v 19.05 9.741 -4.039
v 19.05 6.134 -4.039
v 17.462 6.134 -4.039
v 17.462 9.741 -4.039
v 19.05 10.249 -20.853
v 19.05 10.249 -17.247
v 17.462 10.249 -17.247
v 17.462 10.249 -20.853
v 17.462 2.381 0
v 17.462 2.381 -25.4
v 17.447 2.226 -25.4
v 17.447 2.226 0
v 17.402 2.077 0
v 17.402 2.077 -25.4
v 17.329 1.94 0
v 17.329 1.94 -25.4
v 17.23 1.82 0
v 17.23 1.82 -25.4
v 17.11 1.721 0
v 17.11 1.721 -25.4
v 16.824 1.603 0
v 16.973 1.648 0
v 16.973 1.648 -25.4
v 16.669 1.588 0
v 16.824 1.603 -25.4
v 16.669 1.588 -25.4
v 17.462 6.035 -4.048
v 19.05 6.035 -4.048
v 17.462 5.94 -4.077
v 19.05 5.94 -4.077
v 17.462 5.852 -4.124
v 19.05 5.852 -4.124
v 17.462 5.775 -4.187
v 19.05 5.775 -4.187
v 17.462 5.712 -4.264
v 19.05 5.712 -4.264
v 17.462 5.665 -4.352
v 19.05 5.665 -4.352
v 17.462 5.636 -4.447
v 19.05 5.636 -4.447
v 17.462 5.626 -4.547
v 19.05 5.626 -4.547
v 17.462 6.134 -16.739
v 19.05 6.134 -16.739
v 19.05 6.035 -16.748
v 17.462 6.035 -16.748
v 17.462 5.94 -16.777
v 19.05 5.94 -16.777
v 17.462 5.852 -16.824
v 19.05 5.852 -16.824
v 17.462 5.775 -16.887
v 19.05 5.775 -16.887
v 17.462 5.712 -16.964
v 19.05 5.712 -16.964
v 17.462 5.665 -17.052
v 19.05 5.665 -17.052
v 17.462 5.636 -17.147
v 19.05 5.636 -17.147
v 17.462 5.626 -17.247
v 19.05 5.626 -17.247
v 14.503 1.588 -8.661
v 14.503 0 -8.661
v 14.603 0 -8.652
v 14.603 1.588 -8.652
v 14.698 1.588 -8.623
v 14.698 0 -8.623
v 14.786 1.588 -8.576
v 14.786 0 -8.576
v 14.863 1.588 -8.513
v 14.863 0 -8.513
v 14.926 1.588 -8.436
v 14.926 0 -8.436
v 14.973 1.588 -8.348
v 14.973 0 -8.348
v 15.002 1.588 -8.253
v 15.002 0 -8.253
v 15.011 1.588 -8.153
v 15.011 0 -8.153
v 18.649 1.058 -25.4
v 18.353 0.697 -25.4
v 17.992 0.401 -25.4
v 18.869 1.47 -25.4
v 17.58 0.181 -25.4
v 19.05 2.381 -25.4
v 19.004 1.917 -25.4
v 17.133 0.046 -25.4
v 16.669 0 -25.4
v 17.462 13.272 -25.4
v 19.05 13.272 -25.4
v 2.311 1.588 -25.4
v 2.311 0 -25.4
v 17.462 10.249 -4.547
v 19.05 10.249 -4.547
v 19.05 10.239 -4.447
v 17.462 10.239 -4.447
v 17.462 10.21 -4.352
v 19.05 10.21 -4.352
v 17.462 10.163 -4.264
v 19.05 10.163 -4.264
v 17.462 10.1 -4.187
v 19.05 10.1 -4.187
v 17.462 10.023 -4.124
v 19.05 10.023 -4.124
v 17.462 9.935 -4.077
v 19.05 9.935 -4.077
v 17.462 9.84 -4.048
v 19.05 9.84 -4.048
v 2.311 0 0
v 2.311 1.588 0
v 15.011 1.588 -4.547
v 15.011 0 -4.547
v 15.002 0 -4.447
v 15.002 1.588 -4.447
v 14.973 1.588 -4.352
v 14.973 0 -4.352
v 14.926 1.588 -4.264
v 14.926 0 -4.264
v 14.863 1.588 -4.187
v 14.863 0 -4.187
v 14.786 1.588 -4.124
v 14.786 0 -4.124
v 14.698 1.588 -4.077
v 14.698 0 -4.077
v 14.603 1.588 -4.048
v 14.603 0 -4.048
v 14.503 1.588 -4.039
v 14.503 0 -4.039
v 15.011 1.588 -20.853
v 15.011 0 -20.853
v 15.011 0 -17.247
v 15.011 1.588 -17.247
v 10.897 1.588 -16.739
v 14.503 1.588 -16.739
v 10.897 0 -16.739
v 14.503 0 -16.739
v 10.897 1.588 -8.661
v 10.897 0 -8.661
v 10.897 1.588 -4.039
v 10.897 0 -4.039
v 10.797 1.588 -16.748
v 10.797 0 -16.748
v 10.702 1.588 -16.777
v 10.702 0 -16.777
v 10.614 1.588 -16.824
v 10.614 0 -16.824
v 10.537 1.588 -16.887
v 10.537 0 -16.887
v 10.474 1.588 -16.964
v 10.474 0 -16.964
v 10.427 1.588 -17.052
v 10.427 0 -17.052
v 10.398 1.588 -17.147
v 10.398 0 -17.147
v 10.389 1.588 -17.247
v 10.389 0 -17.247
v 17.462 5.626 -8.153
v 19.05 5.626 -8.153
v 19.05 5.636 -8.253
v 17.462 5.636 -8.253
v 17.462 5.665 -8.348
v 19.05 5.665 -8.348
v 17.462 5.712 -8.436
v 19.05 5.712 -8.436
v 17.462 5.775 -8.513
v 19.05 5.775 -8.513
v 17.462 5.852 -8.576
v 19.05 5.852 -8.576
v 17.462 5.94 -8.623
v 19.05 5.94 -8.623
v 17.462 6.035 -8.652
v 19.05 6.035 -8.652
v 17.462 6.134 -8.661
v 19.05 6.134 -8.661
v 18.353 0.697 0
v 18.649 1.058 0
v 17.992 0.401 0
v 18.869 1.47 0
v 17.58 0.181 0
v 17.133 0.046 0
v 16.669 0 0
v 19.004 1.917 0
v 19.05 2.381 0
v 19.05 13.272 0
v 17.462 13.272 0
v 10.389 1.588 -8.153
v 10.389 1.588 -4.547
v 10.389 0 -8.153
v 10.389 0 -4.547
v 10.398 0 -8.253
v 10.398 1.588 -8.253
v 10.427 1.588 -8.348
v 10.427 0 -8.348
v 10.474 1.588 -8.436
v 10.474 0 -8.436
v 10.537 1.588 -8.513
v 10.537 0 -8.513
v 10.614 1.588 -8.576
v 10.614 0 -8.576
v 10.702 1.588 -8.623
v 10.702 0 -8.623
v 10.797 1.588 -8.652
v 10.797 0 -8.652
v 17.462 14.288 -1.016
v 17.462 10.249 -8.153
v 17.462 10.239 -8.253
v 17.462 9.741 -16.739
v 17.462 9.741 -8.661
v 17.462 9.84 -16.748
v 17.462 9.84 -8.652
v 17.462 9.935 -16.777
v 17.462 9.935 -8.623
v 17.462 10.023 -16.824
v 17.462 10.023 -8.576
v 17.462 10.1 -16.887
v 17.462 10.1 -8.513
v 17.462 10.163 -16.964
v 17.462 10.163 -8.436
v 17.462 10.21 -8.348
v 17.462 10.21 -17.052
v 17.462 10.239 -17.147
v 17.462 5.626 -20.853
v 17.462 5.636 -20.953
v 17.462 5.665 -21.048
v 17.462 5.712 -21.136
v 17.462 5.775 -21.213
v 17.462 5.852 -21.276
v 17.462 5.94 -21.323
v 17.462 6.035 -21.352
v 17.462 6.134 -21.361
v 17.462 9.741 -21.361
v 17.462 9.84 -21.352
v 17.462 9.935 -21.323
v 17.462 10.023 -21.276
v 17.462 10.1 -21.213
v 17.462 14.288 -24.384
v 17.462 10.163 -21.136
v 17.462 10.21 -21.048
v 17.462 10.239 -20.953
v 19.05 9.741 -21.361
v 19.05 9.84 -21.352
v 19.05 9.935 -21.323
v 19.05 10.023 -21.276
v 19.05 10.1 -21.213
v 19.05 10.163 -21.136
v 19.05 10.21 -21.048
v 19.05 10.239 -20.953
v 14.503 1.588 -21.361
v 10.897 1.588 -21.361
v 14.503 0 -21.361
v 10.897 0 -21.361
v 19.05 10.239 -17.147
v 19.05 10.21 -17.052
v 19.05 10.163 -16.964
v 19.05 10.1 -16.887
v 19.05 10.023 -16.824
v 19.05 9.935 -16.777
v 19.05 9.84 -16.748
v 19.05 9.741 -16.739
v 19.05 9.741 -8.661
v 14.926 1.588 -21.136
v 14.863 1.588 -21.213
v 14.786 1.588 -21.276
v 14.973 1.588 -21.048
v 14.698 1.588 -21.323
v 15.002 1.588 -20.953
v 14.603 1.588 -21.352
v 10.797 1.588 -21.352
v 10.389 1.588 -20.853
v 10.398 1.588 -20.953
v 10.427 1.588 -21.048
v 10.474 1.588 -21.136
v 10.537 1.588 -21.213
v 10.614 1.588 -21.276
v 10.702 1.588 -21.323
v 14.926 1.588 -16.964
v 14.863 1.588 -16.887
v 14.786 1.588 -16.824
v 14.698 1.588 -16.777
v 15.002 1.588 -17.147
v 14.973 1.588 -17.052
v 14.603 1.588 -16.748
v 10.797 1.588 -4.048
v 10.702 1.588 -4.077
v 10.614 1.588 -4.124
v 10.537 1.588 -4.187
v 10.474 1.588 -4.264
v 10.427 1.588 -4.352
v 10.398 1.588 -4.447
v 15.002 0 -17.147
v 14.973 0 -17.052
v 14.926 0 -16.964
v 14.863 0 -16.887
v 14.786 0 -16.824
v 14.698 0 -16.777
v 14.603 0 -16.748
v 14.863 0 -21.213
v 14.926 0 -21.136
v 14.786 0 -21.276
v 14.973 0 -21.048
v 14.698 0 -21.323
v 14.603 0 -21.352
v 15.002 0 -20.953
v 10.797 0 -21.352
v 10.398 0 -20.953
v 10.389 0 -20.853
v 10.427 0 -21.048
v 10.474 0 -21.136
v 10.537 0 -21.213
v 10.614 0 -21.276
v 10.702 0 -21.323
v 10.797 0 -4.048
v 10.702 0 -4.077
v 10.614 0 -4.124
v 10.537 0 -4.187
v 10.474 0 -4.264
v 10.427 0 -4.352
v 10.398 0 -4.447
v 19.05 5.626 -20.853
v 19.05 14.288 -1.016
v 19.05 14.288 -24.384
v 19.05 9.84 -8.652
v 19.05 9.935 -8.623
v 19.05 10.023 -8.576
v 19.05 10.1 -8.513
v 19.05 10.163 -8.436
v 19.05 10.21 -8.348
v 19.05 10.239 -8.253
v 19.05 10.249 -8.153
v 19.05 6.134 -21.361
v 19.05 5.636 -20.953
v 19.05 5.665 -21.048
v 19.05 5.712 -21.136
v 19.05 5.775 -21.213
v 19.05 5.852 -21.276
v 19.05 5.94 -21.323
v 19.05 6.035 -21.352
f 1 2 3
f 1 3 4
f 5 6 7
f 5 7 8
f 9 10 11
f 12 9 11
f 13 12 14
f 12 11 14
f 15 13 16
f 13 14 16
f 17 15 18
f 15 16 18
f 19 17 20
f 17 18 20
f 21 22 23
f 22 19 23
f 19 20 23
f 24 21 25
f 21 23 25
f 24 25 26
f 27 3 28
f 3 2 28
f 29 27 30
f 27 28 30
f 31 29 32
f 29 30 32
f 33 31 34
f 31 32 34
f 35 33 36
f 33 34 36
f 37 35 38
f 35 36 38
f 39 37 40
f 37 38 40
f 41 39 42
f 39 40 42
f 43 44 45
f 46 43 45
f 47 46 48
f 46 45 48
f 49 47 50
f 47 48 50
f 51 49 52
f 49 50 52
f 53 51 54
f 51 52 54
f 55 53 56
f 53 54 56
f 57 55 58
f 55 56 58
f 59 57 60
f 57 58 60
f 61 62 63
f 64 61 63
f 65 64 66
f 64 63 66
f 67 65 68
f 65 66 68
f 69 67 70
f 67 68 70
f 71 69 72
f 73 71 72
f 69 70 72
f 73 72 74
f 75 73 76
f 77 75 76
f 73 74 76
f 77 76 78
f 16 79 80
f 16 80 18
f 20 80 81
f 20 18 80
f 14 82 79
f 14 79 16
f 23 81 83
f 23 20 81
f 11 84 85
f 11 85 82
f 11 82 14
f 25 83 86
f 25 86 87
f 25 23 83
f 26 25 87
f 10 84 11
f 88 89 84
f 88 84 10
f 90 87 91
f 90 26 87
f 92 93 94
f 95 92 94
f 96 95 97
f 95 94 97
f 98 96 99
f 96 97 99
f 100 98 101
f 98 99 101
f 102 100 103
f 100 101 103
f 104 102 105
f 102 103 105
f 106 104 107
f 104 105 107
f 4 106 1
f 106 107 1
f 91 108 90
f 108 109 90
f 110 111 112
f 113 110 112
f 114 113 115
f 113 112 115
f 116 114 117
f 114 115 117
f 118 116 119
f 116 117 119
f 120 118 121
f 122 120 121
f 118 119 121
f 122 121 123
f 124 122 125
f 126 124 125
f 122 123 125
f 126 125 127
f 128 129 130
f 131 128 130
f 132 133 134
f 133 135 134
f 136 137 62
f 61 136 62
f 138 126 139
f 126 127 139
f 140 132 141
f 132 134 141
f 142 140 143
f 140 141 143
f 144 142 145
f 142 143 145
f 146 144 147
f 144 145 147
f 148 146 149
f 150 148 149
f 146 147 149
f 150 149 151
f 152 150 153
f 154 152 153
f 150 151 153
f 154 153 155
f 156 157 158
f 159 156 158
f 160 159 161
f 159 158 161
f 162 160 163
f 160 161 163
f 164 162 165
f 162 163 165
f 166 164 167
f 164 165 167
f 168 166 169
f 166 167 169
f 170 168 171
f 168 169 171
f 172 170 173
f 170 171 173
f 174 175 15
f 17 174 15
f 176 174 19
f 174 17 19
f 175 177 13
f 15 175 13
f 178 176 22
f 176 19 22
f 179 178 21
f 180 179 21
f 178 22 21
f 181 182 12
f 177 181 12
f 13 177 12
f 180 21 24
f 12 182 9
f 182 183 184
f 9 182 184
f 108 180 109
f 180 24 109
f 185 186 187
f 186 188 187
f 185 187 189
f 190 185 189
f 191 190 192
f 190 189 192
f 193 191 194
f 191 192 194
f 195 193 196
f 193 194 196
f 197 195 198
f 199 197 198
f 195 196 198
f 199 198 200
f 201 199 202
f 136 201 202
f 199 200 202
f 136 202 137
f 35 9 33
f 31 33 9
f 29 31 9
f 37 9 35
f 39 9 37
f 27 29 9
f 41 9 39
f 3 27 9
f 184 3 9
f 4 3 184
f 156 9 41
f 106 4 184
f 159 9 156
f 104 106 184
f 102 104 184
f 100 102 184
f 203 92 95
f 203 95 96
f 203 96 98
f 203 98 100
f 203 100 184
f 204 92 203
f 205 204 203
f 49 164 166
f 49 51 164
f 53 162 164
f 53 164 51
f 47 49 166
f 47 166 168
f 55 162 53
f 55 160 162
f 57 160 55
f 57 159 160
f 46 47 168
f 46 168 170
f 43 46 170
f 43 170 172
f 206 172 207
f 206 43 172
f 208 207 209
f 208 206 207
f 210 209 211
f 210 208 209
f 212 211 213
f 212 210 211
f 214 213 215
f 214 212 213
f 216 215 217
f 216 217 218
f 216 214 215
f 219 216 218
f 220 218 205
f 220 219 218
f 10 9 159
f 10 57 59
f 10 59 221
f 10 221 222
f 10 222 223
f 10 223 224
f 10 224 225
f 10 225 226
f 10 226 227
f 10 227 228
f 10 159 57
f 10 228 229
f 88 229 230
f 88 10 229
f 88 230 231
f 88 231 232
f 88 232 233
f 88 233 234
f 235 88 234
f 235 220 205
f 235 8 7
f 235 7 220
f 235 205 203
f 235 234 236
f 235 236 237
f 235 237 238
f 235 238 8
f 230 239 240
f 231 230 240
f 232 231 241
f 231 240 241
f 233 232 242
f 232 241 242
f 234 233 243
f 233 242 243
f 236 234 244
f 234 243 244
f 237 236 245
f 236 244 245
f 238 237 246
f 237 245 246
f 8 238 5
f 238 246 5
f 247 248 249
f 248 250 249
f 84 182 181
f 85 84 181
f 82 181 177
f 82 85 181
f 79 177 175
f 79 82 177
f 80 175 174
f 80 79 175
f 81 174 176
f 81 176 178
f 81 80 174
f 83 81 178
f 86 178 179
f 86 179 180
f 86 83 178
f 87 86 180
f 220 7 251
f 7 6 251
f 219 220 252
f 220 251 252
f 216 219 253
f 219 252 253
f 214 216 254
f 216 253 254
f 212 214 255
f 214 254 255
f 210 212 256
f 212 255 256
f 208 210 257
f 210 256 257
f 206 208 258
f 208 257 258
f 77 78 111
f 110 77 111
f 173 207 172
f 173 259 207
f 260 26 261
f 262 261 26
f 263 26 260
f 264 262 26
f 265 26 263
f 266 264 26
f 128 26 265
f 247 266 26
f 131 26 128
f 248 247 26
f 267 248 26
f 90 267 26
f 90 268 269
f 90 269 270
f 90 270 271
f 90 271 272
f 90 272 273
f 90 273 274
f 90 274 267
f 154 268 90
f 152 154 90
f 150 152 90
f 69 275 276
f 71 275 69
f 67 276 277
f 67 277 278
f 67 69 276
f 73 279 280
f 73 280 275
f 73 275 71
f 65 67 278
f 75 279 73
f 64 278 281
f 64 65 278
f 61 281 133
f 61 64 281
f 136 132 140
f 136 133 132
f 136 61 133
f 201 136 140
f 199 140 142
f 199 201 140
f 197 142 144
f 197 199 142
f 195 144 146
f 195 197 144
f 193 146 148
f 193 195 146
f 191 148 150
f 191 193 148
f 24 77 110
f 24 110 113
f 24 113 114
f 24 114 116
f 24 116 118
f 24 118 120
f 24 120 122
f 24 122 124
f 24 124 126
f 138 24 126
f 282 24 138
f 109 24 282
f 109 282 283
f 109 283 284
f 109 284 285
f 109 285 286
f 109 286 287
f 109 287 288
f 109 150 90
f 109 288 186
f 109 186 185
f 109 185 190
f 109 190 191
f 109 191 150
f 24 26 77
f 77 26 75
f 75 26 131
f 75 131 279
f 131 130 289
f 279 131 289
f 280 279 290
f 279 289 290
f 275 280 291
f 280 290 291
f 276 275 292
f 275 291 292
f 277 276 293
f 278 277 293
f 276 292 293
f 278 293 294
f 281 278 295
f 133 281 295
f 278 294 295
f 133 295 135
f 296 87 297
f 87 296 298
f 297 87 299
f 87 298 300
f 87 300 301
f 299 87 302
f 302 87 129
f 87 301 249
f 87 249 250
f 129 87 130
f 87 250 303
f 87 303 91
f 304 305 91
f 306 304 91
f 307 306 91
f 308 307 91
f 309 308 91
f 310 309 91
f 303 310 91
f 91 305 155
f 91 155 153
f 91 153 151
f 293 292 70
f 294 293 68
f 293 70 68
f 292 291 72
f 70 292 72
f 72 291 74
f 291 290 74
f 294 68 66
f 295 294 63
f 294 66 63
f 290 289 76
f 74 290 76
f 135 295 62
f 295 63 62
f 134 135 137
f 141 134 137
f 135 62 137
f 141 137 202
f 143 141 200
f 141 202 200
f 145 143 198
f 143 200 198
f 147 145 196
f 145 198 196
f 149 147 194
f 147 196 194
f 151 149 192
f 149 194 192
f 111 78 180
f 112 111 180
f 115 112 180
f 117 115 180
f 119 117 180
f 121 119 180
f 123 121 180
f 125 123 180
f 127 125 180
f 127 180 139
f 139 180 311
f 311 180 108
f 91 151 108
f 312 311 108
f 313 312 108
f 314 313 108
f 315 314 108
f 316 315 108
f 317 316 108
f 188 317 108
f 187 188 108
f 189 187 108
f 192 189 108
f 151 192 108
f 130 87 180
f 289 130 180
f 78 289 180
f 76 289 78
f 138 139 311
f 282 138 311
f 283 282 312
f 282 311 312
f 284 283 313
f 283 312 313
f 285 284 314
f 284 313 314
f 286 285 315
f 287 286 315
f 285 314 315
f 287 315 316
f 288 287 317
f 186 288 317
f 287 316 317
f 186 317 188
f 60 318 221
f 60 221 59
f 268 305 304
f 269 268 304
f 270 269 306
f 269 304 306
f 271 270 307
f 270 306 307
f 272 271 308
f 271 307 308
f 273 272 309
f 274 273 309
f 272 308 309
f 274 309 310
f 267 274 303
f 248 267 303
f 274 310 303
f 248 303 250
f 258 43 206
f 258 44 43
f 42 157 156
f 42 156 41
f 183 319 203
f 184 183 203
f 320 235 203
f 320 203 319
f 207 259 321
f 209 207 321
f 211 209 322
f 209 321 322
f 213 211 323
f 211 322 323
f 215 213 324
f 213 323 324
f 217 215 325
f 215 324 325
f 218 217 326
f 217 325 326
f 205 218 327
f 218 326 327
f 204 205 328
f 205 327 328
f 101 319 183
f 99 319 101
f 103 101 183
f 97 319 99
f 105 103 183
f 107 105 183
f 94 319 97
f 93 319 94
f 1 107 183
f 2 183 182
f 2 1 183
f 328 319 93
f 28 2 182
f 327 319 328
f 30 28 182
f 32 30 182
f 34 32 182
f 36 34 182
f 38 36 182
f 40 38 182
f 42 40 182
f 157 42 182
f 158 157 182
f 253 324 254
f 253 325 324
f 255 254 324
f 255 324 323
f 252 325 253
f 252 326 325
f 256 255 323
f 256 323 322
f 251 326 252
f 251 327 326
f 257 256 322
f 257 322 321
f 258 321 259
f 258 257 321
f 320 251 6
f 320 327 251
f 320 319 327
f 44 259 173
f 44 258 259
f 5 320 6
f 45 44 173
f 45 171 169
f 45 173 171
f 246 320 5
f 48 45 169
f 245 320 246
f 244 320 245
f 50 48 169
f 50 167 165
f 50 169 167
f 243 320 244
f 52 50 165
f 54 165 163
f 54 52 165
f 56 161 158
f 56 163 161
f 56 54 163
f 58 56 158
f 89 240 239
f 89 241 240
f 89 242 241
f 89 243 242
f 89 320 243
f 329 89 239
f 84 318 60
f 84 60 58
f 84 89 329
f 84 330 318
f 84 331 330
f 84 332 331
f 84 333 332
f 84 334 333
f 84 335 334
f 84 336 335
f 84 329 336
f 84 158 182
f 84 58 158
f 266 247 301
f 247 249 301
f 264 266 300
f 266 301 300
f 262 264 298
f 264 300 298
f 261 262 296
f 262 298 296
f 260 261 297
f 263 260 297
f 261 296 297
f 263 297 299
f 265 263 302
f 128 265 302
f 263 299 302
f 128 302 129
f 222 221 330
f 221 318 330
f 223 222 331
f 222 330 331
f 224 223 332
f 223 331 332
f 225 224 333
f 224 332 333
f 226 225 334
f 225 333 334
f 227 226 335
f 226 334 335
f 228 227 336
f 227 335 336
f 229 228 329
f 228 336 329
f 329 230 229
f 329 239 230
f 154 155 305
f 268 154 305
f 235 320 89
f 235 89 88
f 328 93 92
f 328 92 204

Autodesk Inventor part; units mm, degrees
ref_plane "YZ Plane" through (0, 0, 0) normal (1, 0, 0) x (0, 1, 0)
ref_plane "XZ Plane" through (0, 0, 0) normal (0, 1, 0) x (-1, 0, 0)
sketch "Sketch1" plane through (0, 0, 0) normal (0, 1, 0) x (-1, 0, 0)
  line L0 (-19.05, 0) -> (19.05, 0)
  line L1 (19.05, 0) -> (19.05, -25.4)
  line L2 (19.05, -25.4) -> (-19.05, -25.4)
  line L3 (-19.05, -25.4) -> (-19.05, 0)
  line L4 (19.05, 0) -> (-19.05, -25.4) construction
  point P0 (0, 0)
  point P1 (0, 0)
  dimension "d0" = 38.1
  dimension "d1" = 25.4
extrude "Plate1" add sketch "Sketch1" along normal blind 1.5875
sketch "Sketch2" plane through (17.4625, 0, -25.4) normal (1, 0, 0) x (0, 1, 0)
  line L0 (0, 25.4) -> (0, 0)
  line L1 (0, 0) -> (14.2875, 0)
  line L2 (14.2875, 0) -> (14.2875, 25.4)
  line L3 (14.2875, 25.4) -> (0, 25.4)
edge flange "Flanges" height 12.7 angle 90 thickness 1.5875 bend radius 0.7937 thickness toward (1, 0, 0) relief tear relief width 1.5875 relief depth 0.7937 corner gap 1.5875 corner form 0 edges at (19.05, 1.5875, -12.7) (-19.05, 1.5875, -12.7) wall of the first edge with corners at (17.4625, 0, 0) (17.4625, 0, -25.4) (17.4625, 14.2875, -25.4) (17.4625, 14.2875, 0)
bend "Bend1"
corner "Corner1"
sketch "Sketch3" plane through (19.05, 2.3813, -25.4) normal (1, 0, 0) x (0, 0, -1)
  line L0 (-20.8534, 7.8677) -> (-17.2466, 7.8677)
  line L1 (-16.7386, 7.3597) -> (-16.7386, 3.7529)
  line L2 (-17.2466, 3.2449) -> (-20.8534, 3.2449)
  line L3 (-21.3614, 3.7529) -> (-21.3614, 7.3597)
  arc A0 (-20.8534, 7.8677) -> (-21.3614, 7.3597) centre (-20.8534, 7.3597) ccw
  arc A1 (-16.7386, 7.3597) -> (-17.2466, 7.8677) centre (-17.2466, 7.3597) ccw
  arc A2 (-17.2466, 3.2449) -> (-16.7386, 3.7529) centre (-17.2466, 3.7529) ccw
  arc A3 (-21.3614, 3.7529) -> (-20.8534, 3.2449) centre (-20.8534, 3.7529) ccw
  line L4 (-25.4, 0) -> (-25.4, 11.9063) construction
  line L5 (-25.4, 11.9063) -> (0, 11.9062) construction
  line L6 (-20.8534, 7.3597) -> (-17.2466, 3.7529) construction
  point P0 (-25.4, -2.3812)
  point P1 (-16.7386, 3.2449)
  point P2 (-21.3614, 3.2449)
  point P3 (-19.05, 5.5563)
  dimension "d16" = 4.6228
  dimension "d17" = 0.508
  dimension "d20" = 6.35
  dimension "d21" = 6.35
extrude "Flange Stamp" cut sketch "Sketch3" against normal blind 1.5875
sketch "Sketch7" plane through (19.05, 2.3813, 0) normal (1, 0, 0) x (0, 0, -1)
  arc A0 (4.5466, 7.8677) -> (4.0386, 7.3597) centre (4.5466, 7.3597) ccw construction
  arc A1 (8.1534, 3.2449) -> (8.6614, 3.7529) centre (8.1534, 3.7529) ccw construction
  circle A2 centre (6.35, 5.5563) radius 2.1844
  line L0 (4.5466, 7.3597) -> (8.1534, 3.7529) construction
  point P0 (0, -2.3812)
  dimension "d46" = 4.3688
surface extrude "Flange Circle" sketch "Sketch7" against normal up to surface (1.5875 mm away) shown yes curves A2
ref_plane "Flange Pattern Plane" through (19.05, 7.9375, -4.5466) normal (0, 1, 0) x (1, 0, 0)
sketch "Flange Pattern Sketch" plane through (19.05, 7.9375, -4.5466) normal (0, 1, 0) x (1, 0, 0)
  line L0 (0, 3.6068) -> (0, 0) construction
  line L1 (-45.8186, -4.5466) -> (8.2118, -4.5466) construction
  line L2 (0, 0) -> (-1.5875, 0) construction
  point P0 (-19.05, -4.5466)
  point P1 (0, 1.8034)
  point P2 (0, 14.5034)
  dimension "d131" = 12.7
  dimension "d134" = 12.7
pattern_sketch "Flange Pattern" of "Flange Circle", "Flange Stamp" from (19.05, 7.9375, -6.35) copies at (19.05, 7.9375, -19.05)
sketch "Sketch8" plane through (0, 0, 0) normal (0, -1, 0) x (1, 0, 0)
  line L0 (16.6687, 0) -> (-16.6687, 0) construction
  line L1 (14.5034, -4.0386) -> (10.8966, -4.0386)
  line L2 (10.3886, -4.5466) -> (10.3886, -8.1534)
  line L3 (10.8966, -8.6614) -> (14.5034, -8.6614)
  line L4 (15.0114, -8.1534) -> (15.0114, -4.5466)
  arc A0 (15.0114, -4.5466) -> (14.5034, -4.0386) centre (14.5034, -4.5466) ccw
  arc A1 (14.5034, -8.6614) -> (15.0114, -8.1534) centre (14.5034, -8.1534) ccw
  arc A2 (10.3886, -8.1534) -> (10.8966, -8.6614) centre (10.8966, -8.1534) ccw
  arc A3 (10.8966, -4.0386) -> (10.3886, -4.5466) centre (10.8966, -4.5466) ccw
  line L5 (14.5034, -4.5466) -> (10.8966, -8.1534) construction
  line L6 (19.05, 0) -> (19.05, -25.4) construction
  point P0 (0, 0)
  point P1 (10.3886, -8.6614)
  point P2 (15.0114, -8.6614)
  point P3 (12.7, -6.35)
  dimension "d49" = 4.6228
  dimension "d50" = 0.508
  dimension "d51" = 6.35
  dimension "d52" = 6.35
extrude "Body Stamp" cut sketch "Sketch8" against normal blind 1.5875
sketch "Sketch9" plane through (0, 0, 0) normal (0, -1, 0) x (1, 0, 0)
  arc A0 (15.0114, -4.5466) -> (14.5034, -4.0386) centre (14.5034, -4.5466) ccw construction
  arc A1 (10.3886, -8.1534) -> (10.8966, -8.6614) centre (10.8966, -8.1534) ccw construction
  line L0 (14.5034, -4.5466) -> (10.8966, -8.1534) construction
  circle A2 centre (12.7, -6.35) radius 2.1844
  point P0 (0, 0)
  dimension "d55" = 4.3688
surface extrude "Body Circle" sketch "Sketch9" against normal up to surface (1.5875 mm away) shown yes curves A2
sketch "Body Pattern Sketch" plane through (0, 0, 0) normal (0, -1, 0) x (1, 0, 0)
  line L0 (16.6687, 0) -> (-16.6687, 0) construction
  line L1 (19.05, 0) -> (19.05, -25.4) construction
  circle A0 centre (12.7, -6.35) radius 2.1844 construction
  point P0 (0, 0)
  point P1 (12.7, -19.05)
  dimension "d62" = 12.7
  dimension "d65" = 12.7
  dimension "d139" = 12.7
pattern_sketch "Body Pattern" of "Body Stamp", "Body Circle" from (12.7, 0, -6.35) copies at (12.7, 0, -19.05)
sketch "Arc Length" plane through (17.4625, 2.3813, 0) normal (0, 0, 1) x (1, 0, 0)
  line L0 (0, 0) -> (1.5875, 0) construction
  arc A0 (-0.7937, -0.7938) -> (0, 0) centre (-0.7937, 0) ccw construction
  line L1 (-0.7938, -2.3813) -> (-0.7937, -0.7938) construction
  arc A1 (-0.7938, -2.3813) -> (1.5875, 0) centre (-0.7937, 0) ccw construction
  point P0 (-17.4625, -2.3812)
  dimension "d85" = 3.7405
  dimension "d92" = 1.2468
sketch "Sketch13" plane through (19.05, 14.2875, 0) normal (1, 0, 0) x (0, 0, -1)
  line L0 (0, 0) -> (25.4, 0) construction
  line L1 (62.4078, 0) -> (63.4238, -1.016)
  line L2 (63.4238, -1.016) -> (64.4398, 0)
  line L3 (62.4078, 0) -> (64.4398, 0)
  line L4 (25.4, -11.9062) -> (0, -11.9062) construction
  line L5 (63.4238, -10.8903) -> (61.161, -13.1531)
  line L6 (61.161, -13.1531) -> (63.4238, -15.4159)
  line L7 (63.4238, -15.4159) -> (65.6866, -13.1531)
  line L8 (65.6866, -13.1531) -> (63.4238, -10.8903)
  line L9 (63.4238, -10.8903) -> (63.4238, -15.4159) construction
  line L10 (63.4238, -1.016) -> (63.4238, -10.8903) construction
  line L11 (0, -11.9062) -> (25.4, -11.9062) construction
  point P0 (0, -14.2875)
  dimension "d86" = 4.5256
  dimension "d88" = 1.016
  dimension "d91" = 1.016
  dimension "d102" = 63.4238
feature "Notch" [suppressed]
mirror "Notch Mirror" [suppressed]
pattern_linear "Notch Pattern" [suppressed]
chamfer "End Chamfer" distance 1.016 angle 45 4 edges at (-18.2562, 14.2875, -25.4) (18.2563, 14.2875, -25.4) (-18.2562, 14.2875, 0) (18.2562, 14.2875, 0)
sketch "Sketch14" plane through (-19.05, 2.3813, 419.1) normal (1, 0, 0) x (0, 0, -1)
  line L0 (419.1, 11.9063) -> (444.5, 11.9063) construction
  line L1 (419.1, 0) -> (419.1, 11.9063) construction
  line L2 (419.1, -2.3813) -> (444.5, -2.3813) construction
  line L3 (419.1, 11.9063) -> (444.5, 11.9063)
  line L4 (444.5, 11.9063) -> (444.5, -2.3813)
  line L5 (444.5, -2.3813) -> (419.1, -2.3813)
  line L6 (419.1, -2.3813) -> (419.1, 11.9063)
  point P0 (419.1, -2.3812)
  point P1 (382.0521, -1.9844)
extrude "Half Cut" cut sketch "Sketch14" along normal blind 21.3614
equation "\"d1\" = 12.7 * Length"
equation "\"d18\" = Thickness"
equation "\"d53\" = Thickness"
equation "\"d89\" = Thickness"
equation "\"d2\" = Thickness"
equation "\"d3\" = BendReliefWidth"
equation "\"d4\" = BendReliefDepth"
equation "\"d5\" = MinimumRemnant"
equation "\"d6\" = TransitionRadius"
equation "\"d10\" = CornerReliefSize"
equation "\"d11\" = GapSize"
equation "\"d12\" = JacobiRadiusSize"
equation "\"BendRadius\" = Thickness"
equation "\"BendReliefWidth\" = Thickness"
equation "\"BendReliefDepth\" = 0.5 * Thickness"
equation "\"CornerReliefSize\" = 4 * Thickness"
equation "\"MinimumRemnant\" = 2 * Thickness"
equation "\"TransitionRadius\" = BendRadius"
equation "\"JacobiRadiusSize\" = BendRadius"
equation "\"GapSize\" = Thickness"
equation "\"Length\" = 2"
equation "\"Thickness\" = 1.5875"
properties part number "Alu C 1x3x1x35"
